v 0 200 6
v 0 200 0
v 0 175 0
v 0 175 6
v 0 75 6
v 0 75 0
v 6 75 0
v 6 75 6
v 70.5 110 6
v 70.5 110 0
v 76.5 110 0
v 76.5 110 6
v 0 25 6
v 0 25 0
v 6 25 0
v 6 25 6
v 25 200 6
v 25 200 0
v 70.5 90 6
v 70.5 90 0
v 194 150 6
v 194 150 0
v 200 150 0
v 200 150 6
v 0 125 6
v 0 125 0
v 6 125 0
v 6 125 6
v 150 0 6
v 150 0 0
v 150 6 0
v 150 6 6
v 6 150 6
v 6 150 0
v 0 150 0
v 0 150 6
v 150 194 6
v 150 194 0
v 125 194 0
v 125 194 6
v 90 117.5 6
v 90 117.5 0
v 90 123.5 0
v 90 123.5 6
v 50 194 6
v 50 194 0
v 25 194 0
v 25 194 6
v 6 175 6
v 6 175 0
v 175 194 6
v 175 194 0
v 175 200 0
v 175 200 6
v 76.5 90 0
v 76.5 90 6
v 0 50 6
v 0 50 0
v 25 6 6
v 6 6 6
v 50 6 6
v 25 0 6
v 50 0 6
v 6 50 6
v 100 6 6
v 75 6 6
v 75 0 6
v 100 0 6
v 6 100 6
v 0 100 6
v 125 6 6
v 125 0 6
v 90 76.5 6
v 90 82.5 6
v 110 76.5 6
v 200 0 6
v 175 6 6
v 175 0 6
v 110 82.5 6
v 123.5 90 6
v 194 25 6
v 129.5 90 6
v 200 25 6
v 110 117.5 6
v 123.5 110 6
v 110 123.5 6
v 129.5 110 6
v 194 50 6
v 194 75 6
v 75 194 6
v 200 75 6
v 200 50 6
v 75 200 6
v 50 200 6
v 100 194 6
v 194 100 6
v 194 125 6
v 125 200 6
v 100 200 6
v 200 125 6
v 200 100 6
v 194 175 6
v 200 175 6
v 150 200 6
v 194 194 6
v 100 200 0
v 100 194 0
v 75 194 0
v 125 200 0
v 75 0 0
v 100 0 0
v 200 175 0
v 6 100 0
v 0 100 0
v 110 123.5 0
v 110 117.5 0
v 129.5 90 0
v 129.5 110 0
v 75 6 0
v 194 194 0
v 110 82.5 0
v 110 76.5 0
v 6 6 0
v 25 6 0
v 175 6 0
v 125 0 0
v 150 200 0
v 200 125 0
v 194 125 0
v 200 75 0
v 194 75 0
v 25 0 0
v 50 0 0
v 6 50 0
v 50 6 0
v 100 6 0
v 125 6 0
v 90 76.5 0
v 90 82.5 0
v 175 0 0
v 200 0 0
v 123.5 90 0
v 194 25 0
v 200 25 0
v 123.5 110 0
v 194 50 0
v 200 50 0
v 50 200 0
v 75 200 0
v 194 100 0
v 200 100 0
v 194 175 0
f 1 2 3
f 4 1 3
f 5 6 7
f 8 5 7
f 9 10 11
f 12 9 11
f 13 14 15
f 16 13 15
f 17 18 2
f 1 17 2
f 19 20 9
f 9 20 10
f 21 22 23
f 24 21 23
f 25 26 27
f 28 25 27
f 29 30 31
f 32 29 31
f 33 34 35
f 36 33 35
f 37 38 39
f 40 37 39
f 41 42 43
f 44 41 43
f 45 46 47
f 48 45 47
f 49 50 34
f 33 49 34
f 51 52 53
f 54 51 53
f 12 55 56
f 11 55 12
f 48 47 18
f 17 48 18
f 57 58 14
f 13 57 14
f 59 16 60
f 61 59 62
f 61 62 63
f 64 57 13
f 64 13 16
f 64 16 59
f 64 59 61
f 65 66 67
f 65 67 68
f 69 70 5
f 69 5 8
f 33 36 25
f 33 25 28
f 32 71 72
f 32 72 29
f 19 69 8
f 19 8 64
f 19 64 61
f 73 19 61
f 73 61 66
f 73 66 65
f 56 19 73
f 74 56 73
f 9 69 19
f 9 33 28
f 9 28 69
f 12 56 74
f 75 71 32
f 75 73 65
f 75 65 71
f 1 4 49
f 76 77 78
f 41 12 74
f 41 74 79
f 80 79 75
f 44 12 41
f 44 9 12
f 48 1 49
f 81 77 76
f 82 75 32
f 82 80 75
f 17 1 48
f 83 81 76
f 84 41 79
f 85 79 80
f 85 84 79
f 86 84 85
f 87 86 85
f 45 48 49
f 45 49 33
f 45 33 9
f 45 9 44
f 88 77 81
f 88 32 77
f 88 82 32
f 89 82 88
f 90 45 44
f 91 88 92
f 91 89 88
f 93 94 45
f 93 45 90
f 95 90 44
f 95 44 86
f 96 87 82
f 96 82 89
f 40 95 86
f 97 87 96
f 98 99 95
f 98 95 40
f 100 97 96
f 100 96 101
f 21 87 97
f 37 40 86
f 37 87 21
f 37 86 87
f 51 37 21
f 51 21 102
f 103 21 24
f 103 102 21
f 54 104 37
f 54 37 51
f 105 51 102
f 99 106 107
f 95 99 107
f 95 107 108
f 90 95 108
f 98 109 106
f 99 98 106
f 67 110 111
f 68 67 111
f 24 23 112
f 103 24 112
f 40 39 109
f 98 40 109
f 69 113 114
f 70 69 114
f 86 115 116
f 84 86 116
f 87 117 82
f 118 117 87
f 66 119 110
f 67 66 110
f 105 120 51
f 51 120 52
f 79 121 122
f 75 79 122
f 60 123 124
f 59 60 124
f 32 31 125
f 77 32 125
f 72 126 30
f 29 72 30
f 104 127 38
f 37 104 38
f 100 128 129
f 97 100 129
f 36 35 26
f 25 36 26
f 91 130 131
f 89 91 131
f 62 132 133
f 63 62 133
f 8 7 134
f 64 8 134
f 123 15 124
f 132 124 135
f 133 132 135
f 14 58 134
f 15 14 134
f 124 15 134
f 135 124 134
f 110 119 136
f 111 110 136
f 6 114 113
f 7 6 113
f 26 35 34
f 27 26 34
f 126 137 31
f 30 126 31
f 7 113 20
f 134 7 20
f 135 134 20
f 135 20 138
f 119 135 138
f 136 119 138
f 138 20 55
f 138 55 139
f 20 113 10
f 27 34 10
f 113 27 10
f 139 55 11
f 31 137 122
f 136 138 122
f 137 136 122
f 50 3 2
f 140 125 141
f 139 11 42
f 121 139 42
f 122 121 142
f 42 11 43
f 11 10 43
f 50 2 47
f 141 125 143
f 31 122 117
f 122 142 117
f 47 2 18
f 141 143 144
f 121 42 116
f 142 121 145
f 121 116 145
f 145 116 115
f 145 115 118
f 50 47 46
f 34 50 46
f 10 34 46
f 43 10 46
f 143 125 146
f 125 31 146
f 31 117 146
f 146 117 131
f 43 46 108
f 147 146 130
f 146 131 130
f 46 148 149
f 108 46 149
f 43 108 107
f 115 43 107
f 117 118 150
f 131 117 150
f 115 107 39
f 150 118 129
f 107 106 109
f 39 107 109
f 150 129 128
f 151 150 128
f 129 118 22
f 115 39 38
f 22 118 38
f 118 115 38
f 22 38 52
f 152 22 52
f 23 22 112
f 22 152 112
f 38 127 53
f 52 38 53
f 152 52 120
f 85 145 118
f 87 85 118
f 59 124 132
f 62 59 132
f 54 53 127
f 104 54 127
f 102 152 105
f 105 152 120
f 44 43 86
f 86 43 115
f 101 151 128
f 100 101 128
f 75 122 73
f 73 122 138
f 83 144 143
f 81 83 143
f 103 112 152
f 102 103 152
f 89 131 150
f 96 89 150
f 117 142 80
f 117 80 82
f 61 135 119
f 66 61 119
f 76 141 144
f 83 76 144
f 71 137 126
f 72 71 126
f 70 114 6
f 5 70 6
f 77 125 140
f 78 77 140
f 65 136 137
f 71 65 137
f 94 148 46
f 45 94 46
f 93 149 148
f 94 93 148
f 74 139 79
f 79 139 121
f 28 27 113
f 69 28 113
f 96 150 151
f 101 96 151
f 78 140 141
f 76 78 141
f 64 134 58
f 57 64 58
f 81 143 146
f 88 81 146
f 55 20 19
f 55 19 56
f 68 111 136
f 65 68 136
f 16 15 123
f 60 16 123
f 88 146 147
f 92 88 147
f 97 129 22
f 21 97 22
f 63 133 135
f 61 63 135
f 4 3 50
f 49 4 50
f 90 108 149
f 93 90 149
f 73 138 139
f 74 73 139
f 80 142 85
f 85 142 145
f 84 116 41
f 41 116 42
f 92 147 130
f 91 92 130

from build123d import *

# Parameters (mm, degrees)
ESBO_O1_W                = 6
ESBO_O1_H                = 20
RESSALTO_EXTRUS_O1_DEPTH = 6


with BuildPart() as part:
    # Esboço1 → Ressalto-extrusão1 (new body)
    with BuildSketch(Plane.XY):
        Polygon((194, 150), (200, 150), (200, 175), (194, 175), (194, 194), (175, 194), (175, 200), (150, 200), (150, 194), (125, 194), (125, 200), (100, 200), (100, 194), (75, 194), (75, 200), (50, 200), (50, 194), (25, 194), (25, 200), (0, 200), (0, 175), (6, 175), (6, 150), (0, 150), (0, 125), (6, 125), (6, 100), (0, 100), (0, 75), (6, 75), (6, 50), (0, 50), (0, 25), (6, 25), (6, 6), (25, 6), (25, 0), (50, 0), (50, 6), (75, 6), (75, 0), (100, 0), (100, 6), (125, 6), (125, 0), (150, 0), (150, 6), (175, 6), (175, 0), (200, 0), (200, 25), (194, 25), (194, 50), (200, 50), (200, 75), (194, 75), (194, 100), (200, 100), (200, 125), (194, 125), align=None)
        Polygon((100, 76.5), (90, 76.5), (90, 82.5), (100, 82.5), (110, 82.5), (110, 76.5), align=None, mode=Mode.SUBTRACT)
        with Locations((73.5, 100)):
            Rectangle(ESBO_O1_W, ESBO_O1_H, mode=Mode.SUBTRACT)
        Polygon((110, 117.5), (100, 117.5), (90, 117.5), (90, 123.5), (100, 123.5), (110, 123.5), align=None, mode=Mode.SUBTRACT)
        with Locations((126.5, 100)):
            Rectangle(ESBO_O1_W, ESBO_O1_H, mode=Mode.SUBTRACT)
    extrude(amount=RESSALTO_EXTRUS_O1_DEPTH)


solid = part.part
